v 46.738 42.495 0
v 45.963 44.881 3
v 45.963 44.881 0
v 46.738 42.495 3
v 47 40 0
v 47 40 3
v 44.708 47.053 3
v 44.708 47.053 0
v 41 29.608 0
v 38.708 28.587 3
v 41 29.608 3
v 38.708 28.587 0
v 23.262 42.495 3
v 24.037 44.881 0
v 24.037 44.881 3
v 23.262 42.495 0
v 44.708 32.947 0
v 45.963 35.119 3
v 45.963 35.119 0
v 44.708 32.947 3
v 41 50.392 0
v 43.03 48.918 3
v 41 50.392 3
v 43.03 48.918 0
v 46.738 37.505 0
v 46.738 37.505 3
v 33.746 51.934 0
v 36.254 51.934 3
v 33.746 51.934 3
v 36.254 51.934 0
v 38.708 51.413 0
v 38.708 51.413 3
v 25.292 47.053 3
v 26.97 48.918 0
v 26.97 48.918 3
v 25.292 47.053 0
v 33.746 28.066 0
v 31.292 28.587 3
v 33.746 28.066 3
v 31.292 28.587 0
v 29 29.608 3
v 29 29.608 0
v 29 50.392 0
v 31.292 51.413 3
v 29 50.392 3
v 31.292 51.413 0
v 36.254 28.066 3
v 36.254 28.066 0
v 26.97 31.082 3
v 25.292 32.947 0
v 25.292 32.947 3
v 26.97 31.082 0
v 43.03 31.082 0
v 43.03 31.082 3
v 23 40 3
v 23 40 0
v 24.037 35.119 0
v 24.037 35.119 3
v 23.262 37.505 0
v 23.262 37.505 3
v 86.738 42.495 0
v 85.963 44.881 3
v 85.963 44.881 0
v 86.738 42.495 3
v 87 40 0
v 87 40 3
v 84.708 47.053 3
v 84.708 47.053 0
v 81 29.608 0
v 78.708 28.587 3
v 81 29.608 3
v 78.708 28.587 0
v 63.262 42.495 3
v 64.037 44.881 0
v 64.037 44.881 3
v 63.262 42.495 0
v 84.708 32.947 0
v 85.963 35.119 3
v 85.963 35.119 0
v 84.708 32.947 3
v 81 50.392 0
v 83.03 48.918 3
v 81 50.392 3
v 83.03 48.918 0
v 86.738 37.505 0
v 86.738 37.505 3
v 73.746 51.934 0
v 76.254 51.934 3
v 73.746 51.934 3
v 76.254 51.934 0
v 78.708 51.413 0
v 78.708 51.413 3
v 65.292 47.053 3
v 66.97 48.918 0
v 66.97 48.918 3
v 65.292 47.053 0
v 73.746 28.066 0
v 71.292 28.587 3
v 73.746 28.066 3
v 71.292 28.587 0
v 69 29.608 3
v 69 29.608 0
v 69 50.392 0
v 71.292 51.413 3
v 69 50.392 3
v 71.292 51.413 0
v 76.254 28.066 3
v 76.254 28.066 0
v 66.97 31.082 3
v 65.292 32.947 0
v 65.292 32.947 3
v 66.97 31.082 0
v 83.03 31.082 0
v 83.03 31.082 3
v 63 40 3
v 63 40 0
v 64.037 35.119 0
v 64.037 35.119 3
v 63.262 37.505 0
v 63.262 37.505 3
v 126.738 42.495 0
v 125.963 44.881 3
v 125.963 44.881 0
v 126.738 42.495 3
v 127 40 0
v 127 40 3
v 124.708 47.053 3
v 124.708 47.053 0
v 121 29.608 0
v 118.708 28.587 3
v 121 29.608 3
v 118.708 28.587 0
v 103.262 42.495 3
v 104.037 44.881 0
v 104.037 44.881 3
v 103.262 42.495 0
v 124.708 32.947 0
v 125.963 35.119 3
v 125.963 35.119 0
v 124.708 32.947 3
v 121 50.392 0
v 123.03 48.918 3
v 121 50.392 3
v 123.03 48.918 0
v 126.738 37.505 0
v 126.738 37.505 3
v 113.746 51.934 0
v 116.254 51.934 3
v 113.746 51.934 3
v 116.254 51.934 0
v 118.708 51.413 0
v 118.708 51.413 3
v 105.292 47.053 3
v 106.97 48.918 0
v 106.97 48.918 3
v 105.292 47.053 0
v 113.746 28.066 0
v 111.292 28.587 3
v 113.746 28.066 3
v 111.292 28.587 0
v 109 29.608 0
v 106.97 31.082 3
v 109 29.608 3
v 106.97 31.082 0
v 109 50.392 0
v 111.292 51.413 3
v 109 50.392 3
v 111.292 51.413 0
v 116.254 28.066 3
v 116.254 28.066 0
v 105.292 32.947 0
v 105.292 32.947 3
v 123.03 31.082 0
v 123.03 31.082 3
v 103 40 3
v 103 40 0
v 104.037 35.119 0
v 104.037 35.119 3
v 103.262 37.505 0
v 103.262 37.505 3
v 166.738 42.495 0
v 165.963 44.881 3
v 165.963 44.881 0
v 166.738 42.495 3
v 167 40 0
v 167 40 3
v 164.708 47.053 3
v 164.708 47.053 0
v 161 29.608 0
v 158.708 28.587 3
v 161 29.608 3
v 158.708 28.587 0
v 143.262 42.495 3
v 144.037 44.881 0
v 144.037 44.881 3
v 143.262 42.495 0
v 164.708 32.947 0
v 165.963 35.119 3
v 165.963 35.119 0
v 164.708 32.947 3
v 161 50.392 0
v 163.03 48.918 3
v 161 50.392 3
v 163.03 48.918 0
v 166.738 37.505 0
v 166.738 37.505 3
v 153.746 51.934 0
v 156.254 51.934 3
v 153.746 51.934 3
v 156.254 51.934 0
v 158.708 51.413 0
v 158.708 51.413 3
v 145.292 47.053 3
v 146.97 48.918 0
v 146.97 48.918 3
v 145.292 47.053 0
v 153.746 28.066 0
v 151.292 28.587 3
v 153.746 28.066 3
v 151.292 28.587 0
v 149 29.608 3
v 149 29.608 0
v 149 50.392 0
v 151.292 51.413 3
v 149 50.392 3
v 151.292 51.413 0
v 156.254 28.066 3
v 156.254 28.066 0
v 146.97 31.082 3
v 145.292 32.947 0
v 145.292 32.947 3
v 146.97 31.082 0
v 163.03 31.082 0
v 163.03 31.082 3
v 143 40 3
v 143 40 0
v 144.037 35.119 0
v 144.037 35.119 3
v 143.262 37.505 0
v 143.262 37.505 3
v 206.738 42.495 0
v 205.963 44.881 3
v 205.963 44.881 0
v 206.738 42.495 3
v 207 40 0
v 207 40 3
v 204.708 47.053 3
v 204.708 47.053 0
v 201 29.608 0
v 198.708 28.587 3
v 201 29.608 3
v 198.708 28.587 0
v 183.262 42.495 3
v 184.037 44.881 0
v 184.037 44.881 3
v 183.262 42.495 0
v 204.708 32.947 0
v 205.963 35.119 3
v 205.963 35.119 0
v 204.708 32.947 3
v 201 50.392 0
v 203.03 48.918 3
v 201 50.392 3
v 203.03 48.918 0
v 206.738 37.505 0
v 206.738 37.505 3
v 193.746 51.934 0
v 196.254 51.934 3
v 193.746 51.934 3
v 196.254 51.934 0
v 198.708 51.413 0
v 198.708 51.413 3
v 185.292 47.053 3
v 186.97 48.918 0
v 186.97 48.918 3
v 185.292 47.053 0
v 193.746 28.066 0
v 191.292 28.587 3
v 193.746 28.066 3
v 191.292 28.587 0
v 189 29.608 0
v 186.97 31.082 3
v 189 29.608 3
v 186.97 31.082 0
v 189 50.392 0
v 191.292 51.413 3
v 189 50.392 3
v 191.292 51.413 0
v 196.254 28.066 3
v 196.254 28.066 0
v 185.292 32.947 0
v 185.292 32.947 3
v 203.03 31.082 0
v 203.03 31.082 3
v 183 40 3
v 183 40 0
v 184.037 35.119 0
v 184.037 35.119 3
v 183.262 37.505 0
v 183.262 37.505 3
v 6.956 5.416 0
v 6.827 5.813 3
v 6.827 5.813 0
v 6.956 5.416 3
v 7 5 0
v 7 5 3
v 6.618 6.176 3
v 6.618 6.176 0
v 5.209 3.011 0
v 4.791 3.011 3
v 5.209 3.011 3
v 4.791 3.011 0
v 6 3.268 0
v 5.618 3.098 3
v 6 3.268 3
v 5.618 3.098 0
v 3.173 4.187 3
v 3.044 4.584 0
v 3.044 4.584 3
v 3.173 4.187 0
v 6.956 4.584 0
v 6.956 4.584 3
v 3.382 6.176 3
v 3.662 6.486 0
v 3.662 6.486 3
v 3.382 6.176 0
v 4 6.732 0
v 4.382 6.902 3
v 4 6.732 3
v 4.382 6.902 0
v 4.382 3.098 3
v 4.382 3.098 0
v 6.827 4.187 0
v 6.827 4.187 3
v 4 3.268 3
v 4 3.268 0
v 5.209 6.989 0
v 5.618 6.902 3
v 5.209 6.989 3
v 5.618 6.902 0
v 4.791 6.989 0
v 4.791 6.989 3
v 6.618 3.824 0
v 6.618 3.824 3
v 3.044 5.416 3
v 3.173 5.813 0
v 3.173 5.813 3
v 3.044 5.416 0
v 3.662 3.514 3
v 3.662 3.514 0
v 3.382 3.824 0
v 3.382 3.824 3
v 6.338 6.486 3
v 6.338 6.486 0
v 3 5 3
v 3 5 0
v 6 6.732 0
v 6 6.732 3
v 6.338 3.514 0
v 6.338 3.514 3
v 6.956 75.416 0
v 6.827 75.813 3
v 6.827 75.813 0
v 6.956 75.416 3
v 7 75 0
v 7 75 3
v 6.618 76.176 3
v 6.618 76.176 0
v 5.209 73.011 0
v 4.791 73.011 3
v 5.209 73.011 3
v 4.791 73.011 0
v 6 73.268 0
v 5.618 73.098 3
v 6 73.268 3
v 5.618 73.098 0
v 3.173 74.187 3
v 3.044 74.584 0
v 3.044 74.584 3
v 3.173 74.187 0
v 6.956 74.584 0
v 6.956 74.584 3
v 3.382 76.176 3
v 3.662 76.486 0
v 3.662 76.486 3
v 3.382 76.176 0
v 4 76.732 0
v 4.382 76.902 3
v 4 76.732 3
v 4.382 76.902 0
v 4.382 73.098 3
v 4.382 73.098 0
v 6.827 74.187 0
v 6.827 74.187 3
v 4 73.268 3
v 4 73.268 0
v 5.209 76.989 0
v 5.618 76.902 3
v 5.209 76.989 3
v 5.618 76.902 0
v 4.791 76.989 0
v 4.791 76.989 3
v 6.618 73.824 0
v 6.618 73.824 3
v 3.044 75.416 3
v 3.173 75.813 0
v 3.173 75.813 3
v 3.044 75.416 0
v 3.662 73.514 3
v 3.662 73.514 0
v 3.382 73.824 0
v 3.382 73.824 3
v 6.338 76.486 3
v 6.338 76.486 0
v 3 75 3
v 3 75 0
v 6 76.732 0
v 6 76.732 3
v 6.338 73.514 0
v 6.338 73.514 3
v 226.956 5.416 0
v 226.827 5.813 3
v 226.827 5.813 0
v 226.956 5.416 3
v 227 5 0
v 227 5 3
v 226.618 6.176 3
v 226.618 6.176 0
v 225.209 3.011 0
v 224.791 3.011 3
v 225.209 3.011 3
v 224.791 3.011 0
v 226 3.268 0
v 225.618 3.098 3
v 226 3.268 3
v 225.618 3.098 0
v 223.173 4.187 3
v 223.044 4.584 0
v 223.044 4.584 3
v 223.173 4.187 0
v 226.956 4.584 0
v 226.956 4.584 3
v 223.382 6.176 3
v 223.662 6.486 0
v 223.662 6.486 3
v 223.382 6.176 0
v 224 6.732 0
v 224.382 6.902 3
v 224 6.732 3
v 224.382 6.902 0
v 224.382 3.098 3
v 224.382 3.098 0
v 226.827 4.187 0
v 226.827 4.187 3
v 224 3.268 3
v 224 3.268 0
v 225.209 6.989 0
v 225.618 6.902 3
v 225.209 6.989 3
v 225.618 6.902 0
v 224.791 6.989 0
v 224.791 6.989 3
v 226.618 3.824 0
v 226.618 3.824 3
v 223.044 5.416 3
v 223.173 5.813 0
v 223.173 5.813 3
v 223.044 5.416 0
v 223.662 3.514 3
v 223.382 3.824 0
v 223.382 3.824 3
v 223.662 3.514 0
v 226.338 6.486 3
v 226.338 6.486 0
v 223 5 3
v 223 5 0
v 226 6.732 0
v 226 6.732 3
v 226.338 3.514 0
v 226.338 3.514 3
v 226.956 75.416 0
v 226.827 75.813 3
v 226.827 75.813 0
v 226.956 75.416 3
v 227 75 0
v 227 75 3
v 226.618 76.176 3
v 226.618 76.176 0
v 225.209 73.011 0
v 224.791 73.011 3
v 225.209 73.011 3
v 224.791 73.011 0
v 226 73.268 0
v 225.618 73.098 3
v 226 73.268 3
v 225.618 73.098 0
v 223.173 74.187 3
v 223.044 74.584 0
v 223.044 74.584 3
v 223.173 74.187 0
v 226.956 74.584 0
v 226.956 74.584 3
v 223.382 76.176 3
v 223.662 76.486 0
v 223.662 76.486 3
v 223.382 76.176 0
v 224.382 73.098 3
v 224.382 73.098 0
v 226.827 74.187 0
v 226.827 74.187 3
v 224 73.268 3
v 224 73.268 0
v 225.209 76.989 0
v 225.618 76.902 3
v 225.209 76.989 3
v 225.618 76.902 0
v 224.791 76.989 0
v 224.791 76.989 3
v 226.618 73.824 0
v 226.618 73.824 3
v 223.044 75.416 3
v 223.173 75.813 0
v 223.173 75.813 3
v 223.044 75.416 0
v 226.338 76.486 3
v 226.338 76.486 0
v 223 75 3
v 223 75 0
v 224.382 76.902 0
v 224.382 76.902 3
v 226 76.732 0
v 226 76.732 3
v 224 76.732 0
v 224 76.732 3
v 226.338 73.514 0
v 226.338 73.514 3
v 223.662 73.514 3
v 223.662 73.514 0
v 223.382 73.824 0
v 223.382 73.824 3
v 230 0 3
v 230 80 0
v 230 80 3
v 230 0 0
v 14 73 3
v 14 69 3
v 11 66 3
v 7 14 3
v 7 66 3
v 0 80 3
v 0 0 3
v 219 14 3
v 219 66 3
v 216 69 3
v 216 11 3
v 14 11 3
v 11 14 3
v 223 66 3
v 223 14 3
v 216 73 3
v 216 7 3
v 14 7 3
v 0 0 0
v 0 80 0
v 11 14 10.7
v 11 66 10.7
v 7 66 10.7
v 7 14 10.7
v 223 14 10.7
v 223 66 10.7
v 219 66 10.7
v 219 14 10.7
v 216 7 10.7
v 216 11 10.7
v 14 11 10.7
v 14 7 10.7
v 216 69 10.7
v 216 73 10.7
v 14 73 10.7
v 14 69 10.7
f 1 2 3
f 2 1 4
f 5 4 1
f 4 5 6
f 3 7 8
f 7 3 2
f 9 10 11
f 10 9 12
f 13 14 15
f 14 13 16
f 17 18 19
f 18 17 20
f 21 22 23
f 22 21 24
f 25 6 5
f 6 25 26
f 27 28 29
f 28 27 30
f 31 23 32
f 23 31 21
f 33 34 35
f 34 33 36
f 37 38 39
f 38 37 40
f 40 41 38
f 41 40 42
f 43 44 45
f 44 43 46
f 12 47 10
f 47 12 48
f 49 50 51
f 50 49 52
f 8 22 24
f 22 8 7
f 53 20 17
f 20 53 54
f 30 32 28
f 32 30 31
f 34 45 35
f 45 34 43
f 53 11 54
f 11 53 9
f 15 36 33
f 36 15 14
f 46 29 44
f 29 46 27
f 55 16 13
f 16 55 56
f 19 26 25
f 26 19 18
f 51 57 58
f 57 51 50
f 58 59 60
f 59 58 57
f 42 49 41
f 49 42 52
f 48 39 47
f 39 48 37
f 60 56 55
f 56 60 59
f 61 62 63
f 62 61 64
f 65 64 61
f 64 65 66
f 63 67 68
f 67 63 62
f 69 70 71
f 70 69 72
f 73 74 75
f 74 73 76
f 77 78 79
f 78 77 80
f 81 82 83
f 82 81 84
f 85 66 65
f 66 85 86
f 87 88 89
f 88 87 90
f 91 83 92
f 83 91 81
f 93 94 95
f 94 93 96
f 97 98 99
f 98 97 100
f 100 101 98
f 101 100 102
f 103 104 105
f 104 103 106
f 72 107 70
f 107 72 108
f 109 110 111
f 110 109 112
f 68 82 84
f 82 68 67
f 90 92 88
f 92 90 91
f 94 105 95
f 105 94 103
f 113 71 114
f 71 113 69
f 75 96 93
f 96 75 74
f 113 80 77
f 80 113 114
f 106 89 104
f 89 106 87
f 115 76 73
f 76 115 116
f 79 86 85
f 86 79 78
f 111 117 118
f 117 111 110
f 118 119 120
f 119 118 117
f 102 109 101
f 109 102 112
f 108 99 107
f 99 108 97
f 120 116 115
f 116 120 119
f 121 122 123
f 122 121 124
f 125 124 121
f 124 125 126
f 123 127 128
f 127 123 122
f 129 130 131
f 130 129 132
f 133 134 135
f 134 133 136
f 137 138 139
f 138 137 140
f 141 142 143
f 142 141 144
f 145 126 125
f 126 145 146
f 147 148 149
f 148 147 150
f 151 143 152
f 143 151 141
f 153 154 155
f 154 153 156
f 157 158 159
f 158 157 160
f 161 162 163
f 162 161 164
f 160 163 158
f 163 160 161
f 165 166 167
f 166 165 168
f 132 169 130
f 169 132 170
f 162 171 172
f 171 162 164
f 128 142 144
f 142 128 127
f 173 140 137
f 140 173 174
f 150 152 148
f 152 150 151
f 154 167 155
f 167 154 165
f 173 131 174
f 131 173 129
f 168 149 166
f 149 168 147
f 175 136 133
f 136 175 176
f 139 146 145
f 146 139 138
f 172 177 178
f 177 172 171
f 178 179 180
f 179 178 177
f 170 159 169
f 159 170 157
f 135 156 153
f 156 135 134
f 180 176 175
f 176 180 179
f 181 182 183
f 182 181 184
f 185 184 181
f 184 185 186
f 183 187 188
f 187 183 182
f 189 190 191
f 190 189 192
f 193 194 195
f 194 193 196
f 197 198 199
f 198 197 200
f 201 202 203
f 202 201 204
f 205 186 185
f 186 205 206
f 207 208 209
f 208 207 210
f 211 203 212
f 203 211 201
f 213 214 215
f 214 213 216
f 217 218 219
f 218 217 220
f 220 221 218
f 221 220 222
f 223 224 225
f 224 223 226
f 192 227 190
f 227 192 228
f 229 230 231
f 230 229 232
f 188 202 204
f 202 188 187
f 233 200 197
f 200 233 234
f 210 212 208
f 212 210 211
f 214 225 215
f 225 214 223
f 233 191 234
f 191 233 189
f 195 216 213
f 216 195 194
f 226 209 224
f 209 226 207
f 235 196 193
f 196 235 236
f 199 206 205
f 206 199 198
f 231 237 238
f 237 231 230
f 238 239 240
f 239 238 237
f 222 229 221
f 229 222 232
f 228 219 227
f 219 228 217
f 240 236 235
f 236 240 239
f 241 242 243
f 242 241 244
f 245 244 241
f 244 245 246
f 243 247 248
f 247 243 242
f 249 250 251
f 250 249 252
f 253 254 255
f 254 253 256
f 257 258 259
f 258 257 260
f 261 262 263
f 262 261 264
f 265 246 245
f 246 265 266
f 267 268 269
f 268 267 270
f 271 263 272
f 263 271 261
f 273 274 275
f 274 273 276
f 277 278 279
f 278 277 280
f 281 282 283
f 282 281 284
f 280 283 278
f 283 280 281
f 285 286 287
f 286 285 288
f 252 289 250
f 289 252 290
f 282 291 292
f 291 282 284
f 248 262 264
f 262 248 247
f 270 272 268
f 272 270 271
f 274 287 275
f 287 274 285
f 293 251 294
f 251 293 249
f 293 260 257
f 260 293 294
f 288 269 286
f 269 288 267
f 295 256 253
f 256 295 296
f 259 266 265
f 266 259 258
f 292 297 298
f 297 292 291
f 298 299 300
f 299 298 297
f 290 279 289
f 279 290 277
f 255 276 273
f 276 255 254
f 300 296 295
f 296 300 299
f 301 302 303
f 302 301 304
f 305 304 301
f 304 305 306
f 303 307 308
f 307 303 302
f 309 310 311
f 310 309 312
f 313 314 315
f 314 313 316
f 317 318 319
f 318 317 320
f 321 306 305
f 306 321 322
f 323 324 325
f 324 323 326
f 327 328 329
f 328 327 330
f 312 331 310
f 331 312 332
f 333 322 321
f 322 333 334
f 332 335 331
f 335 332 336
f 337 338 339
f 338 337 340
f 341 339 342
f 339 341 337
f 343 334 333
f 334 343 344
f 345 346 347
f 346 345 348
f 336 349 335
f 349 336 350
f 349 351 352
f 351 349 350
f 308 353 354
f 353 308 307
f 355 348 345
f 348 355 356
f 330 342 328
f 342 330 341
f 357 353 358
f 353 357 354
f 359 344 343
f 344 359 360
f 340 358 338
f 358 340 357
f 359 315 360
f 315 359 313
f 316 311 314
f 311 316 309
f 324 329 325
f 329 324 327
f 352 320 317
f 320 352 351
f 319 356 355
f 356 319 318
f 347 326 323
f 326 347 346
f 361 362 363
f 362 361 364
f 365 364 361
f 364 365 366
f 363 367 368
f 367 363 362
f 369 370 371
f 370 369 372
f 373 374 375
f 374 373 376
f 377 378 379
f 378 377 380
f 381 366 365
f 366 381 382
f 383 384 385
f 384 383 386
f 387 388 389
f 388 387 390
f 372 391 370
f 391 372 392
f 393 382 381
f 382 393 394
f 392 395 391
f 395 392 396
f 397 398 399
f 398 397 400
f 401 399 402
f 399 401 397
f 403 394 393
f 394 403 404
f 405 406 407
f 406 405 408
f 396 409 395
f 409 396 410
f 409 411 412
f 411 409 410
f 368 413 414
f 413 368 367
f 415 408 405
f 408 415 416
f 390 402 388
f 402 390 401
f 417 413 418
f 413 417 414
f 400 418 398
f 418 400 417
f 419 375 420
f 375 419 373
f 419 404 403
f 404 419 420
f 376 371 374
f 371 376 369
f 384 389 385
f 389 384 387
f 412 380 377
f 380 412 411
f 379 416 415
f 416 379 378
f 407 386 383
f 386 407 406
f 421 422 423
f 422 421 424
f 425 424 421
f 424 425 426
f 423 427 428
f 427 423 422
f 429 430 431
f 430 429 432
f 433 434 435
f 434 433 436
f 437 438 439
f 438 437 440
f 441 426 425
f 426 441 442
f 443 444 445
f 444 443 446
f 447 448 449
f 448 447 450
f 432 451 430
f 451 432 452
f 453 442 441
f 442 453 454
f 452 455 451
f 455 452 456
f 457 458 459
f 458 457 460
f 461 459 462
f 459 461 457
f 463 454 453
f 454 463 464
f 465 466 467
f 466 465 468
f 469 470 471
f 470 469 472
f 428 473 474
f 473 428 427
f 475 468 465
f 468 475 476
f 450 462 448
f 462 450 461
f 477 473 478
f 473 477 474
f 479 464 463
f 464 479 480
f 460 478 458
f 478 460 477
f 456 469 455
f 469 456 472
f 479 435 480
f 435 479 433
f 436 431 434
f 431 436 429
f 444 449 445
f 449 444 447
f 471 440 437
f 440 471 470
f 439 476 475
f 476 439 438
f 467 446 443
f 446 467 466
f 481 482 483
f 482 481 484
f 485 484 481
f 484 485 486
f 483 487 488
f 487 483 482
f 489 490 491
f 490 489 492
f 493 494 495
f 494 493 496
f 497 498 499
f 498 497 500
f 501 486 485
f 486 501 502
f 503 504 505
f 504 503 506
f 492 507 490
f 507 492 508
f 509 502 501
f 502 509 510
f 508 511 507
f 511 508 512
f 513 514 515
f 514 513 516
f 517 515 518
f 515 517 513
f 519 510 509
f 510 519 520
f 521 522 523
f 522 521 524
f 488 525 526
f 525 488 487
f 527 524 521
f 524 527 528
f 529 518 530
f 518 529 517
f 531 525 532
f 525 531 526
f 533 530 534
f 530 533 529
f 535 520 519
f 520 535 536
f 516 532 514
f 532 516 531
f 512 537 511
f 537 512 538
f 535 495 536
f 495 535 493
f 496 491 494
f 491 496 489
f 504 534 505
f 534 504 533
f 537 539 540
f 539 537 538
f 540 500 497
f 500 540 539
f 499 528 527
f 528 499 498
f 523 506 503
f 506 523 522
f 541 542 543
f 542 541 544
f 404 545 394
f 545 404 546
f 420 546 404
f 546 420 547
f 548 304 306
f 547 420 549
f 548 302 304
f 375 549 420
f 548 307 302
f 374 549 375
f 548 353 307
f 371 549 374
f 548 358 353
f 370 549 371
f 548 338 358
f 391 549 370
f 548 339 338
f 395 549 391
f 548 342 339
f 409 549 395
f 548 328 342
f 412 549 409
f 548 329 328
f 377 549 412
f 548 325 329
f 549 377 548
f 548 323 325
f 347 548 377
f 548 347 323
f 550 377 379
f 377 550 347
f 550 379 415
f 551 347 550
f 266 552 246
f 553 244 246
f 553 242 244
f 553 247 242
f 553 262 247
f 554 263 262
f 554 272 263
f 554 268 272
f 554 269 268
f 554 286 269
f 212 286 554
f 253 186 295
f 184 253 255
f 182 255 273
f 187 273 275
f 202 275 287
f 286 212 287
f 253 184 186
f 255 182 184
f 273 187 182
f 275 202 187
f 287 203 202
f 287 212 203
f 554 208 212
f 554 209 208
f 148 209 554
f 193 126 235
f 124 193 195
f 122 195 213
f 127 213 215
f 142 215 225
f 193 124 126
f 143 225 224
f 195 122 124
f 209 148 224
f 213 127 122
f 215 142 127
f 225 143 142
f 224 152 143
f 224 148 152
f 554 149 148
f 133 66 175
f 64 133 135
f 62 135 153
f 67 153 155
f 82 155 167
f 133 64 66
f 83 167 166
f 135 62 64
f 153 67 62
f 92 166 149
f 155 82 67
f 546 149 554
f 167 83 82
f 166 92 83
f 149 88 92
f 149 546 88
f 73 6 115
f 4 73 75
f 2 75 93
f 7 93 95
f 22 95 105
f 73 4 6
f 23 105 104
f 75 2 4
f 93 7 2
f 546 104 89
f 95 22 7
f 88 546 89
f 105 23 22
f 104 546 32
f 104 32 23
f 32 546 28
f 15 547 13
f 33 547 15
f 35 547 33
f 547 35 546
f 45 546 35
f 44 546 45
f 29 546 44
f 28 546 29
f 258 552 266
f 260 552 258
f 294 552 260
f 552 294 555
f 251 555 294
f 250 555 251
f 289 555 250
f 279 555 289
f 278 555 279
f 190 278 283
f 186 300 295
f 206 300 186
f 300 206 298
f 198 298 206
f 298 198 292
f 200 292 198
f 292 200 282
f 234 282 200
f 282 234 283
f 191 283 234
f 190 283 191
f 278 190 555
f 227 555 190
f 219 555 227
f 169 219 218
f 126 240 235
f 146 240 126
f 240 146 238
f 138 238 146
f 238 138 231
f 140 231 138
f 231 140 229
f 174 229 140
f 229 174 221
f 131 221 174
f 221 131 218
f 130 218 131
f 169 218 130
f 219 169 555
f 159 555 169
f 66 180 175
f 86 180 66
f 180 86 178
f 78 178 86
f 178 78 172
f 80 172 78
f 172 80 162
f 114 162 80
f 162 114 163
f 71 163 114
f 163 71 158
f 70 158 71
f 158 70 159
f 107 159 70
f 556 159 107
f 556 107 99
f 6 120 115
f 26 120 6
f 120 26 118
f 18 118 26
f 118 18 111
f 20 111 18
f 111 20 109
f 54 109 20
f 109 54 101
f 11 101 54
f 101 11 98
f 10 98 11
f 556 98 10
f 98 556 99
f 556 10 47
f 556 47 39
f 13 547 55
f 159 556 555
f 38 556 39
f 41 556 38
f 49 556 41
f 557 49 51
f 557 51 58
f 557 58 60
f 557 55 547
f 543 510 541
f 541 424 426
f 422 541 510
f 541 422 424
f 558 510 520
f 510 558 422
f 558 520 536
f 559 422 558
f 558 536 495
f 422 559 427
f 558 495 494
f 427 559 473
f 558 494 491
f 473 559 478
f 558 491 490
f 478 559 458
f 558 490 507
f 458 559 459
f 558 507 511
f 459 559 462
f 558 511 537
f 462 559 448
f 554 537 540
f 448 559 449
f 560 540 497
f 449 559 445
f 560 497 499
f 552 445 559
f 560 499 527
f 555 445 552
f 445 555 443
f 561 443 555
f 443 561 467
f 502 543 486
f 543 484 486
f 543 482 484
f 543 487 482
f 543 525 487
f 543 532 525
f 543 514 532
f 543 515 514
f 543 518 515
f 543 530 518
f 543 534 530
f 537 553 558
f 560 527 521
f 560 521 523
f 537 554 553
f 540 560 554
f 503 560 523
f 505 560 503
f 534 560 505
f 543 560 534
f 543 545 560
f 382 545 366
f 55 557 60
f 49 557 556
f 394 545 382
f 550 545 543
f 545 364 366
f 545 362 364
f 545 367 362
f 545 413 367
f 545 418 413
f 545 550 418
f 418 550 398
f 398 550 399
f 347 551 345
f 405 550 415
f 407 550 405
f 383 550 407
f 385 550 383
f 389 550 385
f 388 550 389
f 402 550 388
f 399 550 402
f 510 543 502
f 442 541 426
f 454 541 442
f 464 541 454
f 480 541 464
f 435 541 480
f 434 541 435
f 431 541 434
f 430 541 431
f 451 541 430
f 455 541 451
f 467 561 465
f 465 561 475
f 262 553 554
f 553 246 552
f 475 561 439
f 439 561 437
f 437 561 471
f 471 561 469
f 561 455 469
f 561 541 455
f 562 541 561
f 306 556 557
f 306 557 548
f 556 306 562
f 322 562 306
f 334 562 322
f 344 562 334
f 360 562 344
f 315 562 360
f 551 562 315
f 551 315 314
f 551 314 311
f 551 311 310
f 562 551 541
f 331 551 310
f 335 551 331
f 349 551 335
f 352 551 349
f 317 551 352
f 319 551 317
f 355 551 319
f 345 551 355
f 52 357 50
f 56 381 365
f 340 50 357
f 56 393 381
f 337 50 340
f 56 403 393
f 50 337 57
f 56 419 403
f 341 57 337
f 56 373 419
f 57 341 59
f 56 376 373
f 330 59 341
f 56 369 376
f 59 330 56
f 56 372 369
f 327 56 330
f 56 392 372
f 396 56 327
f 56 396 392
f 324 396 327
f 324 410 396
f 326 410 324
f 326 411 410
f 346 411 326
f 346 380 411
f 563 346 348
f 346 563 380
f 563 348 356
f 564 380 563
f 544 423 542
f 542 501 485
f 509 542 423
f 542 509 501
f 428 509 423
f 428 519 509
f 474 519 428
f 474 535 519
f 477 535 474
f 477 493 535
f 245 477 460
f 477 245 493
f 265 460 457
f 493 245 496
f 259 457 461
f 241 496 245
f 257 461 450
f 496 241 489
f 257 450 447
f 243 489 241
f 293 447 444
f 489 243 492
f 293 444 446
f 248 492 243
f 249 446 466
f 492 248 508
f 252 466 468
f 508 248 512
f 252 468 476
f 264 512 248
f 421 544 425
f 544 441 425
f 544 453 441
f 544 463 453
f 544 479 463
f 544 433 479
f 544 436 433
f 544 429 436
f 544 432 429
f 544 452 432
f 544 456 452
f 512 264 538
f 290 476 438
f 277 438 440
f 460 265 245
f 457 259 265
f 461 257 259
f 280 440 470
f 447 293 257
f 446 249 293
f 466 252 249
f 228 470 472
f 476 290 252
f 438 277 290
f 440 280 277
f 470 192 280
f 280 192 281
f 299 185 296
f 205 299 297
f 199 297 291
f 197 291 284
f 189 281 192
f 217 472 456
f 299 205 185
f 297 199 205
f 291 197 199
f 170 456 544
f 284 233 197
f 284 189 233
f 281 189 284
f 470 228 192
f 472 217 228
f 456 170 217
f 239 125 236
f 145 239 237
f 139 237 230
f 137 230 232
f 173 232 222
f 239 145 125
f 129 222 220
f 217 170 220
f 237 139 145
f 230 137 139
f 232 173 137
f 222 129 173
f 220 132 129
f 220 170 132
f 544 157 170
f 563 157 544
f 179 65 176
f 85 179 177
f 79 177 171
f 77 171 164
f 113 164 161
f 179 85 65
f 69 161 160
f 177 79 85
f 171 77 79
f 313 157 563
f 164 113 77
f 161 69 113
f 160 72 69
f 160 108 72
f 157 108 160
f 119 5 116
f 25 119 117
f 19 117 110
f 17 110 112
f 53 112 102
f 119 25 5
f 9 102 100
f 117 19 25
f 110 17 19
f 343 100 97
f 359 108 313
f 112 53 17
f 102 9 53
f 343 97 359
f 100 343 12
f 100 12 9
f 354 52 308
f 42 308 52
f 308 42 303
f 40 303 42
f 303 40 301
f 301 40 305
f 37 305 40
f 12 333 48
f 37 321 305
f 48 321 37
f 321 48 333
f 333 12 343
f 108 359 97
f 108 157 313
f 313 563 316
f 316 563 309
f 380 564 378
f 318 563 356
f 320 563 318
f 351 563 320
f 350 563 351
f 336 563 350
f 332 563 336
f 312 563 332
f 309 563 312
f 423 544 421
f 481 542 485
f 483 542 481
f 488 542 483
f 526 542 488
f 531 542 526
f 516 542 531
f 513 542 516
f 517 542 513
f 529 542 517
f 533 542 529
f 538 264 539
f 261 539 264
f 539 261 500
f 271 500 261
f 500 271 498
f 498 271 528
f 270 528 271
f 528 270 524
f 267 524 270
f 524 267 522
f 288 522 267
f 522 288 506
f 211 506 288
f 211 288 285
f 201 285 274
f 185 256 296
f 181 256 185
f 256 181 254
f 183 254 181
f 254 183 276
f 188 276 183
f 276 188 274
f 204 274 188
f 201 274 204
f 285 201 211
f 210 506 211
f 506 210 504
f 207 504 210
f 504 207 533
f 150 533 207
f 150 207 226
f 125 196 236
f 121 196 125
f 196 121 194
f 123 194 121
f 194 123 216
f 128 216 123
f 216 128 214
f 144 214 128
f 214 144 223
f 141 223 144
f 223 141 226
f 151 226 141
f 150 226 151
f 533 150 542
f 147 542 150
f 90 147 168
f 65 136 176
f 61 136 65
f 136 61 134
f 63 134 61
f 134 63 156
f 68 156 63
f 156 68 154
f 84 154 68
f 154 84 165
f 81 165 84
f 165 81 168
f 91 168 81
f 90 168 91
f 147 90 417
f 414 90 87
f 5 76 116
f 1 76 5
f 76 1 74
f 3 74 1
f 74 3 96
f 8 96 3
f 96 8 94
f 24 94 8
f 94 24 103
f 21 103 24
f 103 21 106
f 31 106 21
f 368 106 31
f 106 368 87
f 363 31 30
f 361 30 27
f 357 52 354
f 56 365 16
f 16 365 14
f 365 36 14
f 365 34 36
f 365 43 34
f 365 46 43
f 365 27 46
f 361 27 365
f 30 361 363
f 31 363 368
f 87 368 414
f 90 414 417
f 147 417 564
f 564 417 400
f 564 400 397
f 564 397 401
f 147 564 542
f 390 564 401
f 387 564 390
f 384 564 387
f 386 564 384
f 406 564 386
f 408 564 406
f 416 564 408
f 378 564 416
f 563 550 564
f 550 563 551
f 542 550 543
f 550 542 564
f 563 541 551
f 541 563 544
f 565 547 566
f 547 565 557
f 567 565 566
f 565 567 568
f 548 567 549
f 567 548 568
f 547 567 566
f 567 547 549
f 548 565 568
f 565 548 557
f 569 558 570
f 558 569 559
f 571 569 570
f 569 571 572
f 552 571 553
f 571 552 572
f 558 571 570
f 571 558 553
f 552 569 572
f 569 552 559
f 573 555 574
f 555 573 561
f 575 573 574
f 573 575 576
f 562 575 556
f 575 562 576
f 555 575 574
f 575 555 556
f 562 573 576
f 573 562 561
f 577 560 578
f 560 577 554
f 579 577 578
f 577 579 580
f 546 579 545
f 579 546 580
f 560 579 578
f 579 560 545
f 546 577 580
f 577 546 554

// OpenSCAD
// file: potentiometer-insert.scad
/*
  3d printable insert for a control panel
  An array of potentiometers may be mounted to the insert.
  The insert can then be mounted into to the face of the control
  panel.

  The idea is, it's easy to cut a large hole in a piece of 1/4 inch
  plywood into which the insert may be fitted, but is is difficult
  (impossible) to cut the tiny holes needed for each individual fader
  in such plywood, and anyway the plywood is too thick.

  To use this file, set the following variables (in mm) and then
  include this file.

  These are intentionally commented out here.

plate_thickness = 3;
countersink = 0.01;
pot_horizontal_spacing = 25;
pot_vertical_spacing = 30;
pot_cols = 4;
pot_rows = 5;
web_thickness = 3;
web_height = 10;
hole_radius = 3.5;
plate_horizontal_border = 15;
plate_vertical_border = 15;
plate_height = pot_rows * pot_vertical_spacing + 2 * plate_vertical_border;
plate_width =  pot_cols * pot_horizontal_spacing + 2 * plate_horizontal_border;
screw_radius = 0.5 * 3; 
screw_edge_offset = 5;

web_thickness = 4;
web_height = 8;
web_edge_offset = screw_edge_offset + screw_radius;
web_screw_offset = 2 * web_edge_offset;
web_horiz_len = plate_width - 2 * web_screw_offset;
web_vert_len = plate_height - 2 * web_screw_offset;

*/

$fn=30;

module undrilled_plate()
{
	echo(plate_width, " x ", plate_height, " x ", plate_thickness);
	cube(size = [plate_width, plate_height, plate_thickness]);
}

module drill_hole(x, y, r)
{
	translate(v = [x, y, -plate_thickness * 0.05])
		cylinder(r1 = r, r2 = r, h = plate_thickness * 1.1);
}

module plate_pot_holes()
{
	for (row = [0 : 1 : pot_rows - 1]) {
		y = plate_vertical_border + (row + 0.5) * pot_vertical_spacing;
		for (col = [0 : 1 : pot_cols - 1]) {
			x = plate_horizontal_border + (col + 0.5) * pot_horizontal_spacing;
			drill_hole(x, y, hole_radius);
		}
	}
}

module plate_screw_holes()
{
	drill_hole(screw_edge_offset, screw_edge_offset, screw_radius);
	drill_hole(screw_edge_offset, plate_height - screw_edge_offset, screw_radius);
	drill_hole(plate_width - screw_edge_offset, screw_edge_offset, screw_radius);
	drill_hole(plate_width - screw_edge_offset, plate_height - screw_edge_offset, screw_radius);
}

module plate()
{
	difference() {
		undrilled_plate();
		plate_pot_holes();
		plate_screw_holes();
	}
}

module webbing()
{
	/* Vertical webbing */
	translate(v = [web_edge_offset, web_screw_offset, plate_thickness * 0.9])
		cube(size = [web_thickness, web_vert_len, web_height]);
	translate(v = [plate_width - web_edge_offset - web_thickness, web_screw_offset, plate_thickness * 0.9])
		cube(size = [web_thickness, web_vert_len, web_height]);
	translate(v = [web_screw_offset, web_edge_offset, plate_thickness * 0.9])
		cube(size = [web_horiz_len, web_thickness, web_height]);
	translate(v = [web_screw_offset, plate_height - web_edge_offset - web_thickness, plate_thickness * 0.9])
		cube(size = [web_horiz_len, web_thickness, web_height]);
}

module pot_array_plate()
{
	union() {
		plate();
		webbing();
	}
}

pot_array_plate();
// main file
/*
  3d printable insert for toggle switches for the Navigation control panel  
*/

plate_thickness = 3;
countersink = 0.01;
pot_horizontal_spacing = 40;
pot_vertical_spacing = 40;
pot_cols = 5;
pot_rows = 1;
web_thickness = 3;
web_height = 10;
hole_radius = 12; /* mm */
plate_horizontal_border = 15;
plate_vertical_border = 20;
plate_height = pot_rows * pot_vertical_spacing + 2 * plate_vertical_border;
plate_width =  pot_cols * pot_horizontal_spacing + 2 * plate_horizontal_border;
screw_radius = 0.5 * 4; 
screw_edge_offset = 5;

web_thickness = 4;
web_height = 8;
web_edge_offset = screw_edge_offset + screw_radius;
web_screw_offset = 2 * web_edge_offset;
web_horiz_len = plate_width - 2 * web_screw_offset;
web_vert_len = plate_height - 2 * web_screw_offset;

include <potentiometer-insert.scad>

pot_array_plate();
